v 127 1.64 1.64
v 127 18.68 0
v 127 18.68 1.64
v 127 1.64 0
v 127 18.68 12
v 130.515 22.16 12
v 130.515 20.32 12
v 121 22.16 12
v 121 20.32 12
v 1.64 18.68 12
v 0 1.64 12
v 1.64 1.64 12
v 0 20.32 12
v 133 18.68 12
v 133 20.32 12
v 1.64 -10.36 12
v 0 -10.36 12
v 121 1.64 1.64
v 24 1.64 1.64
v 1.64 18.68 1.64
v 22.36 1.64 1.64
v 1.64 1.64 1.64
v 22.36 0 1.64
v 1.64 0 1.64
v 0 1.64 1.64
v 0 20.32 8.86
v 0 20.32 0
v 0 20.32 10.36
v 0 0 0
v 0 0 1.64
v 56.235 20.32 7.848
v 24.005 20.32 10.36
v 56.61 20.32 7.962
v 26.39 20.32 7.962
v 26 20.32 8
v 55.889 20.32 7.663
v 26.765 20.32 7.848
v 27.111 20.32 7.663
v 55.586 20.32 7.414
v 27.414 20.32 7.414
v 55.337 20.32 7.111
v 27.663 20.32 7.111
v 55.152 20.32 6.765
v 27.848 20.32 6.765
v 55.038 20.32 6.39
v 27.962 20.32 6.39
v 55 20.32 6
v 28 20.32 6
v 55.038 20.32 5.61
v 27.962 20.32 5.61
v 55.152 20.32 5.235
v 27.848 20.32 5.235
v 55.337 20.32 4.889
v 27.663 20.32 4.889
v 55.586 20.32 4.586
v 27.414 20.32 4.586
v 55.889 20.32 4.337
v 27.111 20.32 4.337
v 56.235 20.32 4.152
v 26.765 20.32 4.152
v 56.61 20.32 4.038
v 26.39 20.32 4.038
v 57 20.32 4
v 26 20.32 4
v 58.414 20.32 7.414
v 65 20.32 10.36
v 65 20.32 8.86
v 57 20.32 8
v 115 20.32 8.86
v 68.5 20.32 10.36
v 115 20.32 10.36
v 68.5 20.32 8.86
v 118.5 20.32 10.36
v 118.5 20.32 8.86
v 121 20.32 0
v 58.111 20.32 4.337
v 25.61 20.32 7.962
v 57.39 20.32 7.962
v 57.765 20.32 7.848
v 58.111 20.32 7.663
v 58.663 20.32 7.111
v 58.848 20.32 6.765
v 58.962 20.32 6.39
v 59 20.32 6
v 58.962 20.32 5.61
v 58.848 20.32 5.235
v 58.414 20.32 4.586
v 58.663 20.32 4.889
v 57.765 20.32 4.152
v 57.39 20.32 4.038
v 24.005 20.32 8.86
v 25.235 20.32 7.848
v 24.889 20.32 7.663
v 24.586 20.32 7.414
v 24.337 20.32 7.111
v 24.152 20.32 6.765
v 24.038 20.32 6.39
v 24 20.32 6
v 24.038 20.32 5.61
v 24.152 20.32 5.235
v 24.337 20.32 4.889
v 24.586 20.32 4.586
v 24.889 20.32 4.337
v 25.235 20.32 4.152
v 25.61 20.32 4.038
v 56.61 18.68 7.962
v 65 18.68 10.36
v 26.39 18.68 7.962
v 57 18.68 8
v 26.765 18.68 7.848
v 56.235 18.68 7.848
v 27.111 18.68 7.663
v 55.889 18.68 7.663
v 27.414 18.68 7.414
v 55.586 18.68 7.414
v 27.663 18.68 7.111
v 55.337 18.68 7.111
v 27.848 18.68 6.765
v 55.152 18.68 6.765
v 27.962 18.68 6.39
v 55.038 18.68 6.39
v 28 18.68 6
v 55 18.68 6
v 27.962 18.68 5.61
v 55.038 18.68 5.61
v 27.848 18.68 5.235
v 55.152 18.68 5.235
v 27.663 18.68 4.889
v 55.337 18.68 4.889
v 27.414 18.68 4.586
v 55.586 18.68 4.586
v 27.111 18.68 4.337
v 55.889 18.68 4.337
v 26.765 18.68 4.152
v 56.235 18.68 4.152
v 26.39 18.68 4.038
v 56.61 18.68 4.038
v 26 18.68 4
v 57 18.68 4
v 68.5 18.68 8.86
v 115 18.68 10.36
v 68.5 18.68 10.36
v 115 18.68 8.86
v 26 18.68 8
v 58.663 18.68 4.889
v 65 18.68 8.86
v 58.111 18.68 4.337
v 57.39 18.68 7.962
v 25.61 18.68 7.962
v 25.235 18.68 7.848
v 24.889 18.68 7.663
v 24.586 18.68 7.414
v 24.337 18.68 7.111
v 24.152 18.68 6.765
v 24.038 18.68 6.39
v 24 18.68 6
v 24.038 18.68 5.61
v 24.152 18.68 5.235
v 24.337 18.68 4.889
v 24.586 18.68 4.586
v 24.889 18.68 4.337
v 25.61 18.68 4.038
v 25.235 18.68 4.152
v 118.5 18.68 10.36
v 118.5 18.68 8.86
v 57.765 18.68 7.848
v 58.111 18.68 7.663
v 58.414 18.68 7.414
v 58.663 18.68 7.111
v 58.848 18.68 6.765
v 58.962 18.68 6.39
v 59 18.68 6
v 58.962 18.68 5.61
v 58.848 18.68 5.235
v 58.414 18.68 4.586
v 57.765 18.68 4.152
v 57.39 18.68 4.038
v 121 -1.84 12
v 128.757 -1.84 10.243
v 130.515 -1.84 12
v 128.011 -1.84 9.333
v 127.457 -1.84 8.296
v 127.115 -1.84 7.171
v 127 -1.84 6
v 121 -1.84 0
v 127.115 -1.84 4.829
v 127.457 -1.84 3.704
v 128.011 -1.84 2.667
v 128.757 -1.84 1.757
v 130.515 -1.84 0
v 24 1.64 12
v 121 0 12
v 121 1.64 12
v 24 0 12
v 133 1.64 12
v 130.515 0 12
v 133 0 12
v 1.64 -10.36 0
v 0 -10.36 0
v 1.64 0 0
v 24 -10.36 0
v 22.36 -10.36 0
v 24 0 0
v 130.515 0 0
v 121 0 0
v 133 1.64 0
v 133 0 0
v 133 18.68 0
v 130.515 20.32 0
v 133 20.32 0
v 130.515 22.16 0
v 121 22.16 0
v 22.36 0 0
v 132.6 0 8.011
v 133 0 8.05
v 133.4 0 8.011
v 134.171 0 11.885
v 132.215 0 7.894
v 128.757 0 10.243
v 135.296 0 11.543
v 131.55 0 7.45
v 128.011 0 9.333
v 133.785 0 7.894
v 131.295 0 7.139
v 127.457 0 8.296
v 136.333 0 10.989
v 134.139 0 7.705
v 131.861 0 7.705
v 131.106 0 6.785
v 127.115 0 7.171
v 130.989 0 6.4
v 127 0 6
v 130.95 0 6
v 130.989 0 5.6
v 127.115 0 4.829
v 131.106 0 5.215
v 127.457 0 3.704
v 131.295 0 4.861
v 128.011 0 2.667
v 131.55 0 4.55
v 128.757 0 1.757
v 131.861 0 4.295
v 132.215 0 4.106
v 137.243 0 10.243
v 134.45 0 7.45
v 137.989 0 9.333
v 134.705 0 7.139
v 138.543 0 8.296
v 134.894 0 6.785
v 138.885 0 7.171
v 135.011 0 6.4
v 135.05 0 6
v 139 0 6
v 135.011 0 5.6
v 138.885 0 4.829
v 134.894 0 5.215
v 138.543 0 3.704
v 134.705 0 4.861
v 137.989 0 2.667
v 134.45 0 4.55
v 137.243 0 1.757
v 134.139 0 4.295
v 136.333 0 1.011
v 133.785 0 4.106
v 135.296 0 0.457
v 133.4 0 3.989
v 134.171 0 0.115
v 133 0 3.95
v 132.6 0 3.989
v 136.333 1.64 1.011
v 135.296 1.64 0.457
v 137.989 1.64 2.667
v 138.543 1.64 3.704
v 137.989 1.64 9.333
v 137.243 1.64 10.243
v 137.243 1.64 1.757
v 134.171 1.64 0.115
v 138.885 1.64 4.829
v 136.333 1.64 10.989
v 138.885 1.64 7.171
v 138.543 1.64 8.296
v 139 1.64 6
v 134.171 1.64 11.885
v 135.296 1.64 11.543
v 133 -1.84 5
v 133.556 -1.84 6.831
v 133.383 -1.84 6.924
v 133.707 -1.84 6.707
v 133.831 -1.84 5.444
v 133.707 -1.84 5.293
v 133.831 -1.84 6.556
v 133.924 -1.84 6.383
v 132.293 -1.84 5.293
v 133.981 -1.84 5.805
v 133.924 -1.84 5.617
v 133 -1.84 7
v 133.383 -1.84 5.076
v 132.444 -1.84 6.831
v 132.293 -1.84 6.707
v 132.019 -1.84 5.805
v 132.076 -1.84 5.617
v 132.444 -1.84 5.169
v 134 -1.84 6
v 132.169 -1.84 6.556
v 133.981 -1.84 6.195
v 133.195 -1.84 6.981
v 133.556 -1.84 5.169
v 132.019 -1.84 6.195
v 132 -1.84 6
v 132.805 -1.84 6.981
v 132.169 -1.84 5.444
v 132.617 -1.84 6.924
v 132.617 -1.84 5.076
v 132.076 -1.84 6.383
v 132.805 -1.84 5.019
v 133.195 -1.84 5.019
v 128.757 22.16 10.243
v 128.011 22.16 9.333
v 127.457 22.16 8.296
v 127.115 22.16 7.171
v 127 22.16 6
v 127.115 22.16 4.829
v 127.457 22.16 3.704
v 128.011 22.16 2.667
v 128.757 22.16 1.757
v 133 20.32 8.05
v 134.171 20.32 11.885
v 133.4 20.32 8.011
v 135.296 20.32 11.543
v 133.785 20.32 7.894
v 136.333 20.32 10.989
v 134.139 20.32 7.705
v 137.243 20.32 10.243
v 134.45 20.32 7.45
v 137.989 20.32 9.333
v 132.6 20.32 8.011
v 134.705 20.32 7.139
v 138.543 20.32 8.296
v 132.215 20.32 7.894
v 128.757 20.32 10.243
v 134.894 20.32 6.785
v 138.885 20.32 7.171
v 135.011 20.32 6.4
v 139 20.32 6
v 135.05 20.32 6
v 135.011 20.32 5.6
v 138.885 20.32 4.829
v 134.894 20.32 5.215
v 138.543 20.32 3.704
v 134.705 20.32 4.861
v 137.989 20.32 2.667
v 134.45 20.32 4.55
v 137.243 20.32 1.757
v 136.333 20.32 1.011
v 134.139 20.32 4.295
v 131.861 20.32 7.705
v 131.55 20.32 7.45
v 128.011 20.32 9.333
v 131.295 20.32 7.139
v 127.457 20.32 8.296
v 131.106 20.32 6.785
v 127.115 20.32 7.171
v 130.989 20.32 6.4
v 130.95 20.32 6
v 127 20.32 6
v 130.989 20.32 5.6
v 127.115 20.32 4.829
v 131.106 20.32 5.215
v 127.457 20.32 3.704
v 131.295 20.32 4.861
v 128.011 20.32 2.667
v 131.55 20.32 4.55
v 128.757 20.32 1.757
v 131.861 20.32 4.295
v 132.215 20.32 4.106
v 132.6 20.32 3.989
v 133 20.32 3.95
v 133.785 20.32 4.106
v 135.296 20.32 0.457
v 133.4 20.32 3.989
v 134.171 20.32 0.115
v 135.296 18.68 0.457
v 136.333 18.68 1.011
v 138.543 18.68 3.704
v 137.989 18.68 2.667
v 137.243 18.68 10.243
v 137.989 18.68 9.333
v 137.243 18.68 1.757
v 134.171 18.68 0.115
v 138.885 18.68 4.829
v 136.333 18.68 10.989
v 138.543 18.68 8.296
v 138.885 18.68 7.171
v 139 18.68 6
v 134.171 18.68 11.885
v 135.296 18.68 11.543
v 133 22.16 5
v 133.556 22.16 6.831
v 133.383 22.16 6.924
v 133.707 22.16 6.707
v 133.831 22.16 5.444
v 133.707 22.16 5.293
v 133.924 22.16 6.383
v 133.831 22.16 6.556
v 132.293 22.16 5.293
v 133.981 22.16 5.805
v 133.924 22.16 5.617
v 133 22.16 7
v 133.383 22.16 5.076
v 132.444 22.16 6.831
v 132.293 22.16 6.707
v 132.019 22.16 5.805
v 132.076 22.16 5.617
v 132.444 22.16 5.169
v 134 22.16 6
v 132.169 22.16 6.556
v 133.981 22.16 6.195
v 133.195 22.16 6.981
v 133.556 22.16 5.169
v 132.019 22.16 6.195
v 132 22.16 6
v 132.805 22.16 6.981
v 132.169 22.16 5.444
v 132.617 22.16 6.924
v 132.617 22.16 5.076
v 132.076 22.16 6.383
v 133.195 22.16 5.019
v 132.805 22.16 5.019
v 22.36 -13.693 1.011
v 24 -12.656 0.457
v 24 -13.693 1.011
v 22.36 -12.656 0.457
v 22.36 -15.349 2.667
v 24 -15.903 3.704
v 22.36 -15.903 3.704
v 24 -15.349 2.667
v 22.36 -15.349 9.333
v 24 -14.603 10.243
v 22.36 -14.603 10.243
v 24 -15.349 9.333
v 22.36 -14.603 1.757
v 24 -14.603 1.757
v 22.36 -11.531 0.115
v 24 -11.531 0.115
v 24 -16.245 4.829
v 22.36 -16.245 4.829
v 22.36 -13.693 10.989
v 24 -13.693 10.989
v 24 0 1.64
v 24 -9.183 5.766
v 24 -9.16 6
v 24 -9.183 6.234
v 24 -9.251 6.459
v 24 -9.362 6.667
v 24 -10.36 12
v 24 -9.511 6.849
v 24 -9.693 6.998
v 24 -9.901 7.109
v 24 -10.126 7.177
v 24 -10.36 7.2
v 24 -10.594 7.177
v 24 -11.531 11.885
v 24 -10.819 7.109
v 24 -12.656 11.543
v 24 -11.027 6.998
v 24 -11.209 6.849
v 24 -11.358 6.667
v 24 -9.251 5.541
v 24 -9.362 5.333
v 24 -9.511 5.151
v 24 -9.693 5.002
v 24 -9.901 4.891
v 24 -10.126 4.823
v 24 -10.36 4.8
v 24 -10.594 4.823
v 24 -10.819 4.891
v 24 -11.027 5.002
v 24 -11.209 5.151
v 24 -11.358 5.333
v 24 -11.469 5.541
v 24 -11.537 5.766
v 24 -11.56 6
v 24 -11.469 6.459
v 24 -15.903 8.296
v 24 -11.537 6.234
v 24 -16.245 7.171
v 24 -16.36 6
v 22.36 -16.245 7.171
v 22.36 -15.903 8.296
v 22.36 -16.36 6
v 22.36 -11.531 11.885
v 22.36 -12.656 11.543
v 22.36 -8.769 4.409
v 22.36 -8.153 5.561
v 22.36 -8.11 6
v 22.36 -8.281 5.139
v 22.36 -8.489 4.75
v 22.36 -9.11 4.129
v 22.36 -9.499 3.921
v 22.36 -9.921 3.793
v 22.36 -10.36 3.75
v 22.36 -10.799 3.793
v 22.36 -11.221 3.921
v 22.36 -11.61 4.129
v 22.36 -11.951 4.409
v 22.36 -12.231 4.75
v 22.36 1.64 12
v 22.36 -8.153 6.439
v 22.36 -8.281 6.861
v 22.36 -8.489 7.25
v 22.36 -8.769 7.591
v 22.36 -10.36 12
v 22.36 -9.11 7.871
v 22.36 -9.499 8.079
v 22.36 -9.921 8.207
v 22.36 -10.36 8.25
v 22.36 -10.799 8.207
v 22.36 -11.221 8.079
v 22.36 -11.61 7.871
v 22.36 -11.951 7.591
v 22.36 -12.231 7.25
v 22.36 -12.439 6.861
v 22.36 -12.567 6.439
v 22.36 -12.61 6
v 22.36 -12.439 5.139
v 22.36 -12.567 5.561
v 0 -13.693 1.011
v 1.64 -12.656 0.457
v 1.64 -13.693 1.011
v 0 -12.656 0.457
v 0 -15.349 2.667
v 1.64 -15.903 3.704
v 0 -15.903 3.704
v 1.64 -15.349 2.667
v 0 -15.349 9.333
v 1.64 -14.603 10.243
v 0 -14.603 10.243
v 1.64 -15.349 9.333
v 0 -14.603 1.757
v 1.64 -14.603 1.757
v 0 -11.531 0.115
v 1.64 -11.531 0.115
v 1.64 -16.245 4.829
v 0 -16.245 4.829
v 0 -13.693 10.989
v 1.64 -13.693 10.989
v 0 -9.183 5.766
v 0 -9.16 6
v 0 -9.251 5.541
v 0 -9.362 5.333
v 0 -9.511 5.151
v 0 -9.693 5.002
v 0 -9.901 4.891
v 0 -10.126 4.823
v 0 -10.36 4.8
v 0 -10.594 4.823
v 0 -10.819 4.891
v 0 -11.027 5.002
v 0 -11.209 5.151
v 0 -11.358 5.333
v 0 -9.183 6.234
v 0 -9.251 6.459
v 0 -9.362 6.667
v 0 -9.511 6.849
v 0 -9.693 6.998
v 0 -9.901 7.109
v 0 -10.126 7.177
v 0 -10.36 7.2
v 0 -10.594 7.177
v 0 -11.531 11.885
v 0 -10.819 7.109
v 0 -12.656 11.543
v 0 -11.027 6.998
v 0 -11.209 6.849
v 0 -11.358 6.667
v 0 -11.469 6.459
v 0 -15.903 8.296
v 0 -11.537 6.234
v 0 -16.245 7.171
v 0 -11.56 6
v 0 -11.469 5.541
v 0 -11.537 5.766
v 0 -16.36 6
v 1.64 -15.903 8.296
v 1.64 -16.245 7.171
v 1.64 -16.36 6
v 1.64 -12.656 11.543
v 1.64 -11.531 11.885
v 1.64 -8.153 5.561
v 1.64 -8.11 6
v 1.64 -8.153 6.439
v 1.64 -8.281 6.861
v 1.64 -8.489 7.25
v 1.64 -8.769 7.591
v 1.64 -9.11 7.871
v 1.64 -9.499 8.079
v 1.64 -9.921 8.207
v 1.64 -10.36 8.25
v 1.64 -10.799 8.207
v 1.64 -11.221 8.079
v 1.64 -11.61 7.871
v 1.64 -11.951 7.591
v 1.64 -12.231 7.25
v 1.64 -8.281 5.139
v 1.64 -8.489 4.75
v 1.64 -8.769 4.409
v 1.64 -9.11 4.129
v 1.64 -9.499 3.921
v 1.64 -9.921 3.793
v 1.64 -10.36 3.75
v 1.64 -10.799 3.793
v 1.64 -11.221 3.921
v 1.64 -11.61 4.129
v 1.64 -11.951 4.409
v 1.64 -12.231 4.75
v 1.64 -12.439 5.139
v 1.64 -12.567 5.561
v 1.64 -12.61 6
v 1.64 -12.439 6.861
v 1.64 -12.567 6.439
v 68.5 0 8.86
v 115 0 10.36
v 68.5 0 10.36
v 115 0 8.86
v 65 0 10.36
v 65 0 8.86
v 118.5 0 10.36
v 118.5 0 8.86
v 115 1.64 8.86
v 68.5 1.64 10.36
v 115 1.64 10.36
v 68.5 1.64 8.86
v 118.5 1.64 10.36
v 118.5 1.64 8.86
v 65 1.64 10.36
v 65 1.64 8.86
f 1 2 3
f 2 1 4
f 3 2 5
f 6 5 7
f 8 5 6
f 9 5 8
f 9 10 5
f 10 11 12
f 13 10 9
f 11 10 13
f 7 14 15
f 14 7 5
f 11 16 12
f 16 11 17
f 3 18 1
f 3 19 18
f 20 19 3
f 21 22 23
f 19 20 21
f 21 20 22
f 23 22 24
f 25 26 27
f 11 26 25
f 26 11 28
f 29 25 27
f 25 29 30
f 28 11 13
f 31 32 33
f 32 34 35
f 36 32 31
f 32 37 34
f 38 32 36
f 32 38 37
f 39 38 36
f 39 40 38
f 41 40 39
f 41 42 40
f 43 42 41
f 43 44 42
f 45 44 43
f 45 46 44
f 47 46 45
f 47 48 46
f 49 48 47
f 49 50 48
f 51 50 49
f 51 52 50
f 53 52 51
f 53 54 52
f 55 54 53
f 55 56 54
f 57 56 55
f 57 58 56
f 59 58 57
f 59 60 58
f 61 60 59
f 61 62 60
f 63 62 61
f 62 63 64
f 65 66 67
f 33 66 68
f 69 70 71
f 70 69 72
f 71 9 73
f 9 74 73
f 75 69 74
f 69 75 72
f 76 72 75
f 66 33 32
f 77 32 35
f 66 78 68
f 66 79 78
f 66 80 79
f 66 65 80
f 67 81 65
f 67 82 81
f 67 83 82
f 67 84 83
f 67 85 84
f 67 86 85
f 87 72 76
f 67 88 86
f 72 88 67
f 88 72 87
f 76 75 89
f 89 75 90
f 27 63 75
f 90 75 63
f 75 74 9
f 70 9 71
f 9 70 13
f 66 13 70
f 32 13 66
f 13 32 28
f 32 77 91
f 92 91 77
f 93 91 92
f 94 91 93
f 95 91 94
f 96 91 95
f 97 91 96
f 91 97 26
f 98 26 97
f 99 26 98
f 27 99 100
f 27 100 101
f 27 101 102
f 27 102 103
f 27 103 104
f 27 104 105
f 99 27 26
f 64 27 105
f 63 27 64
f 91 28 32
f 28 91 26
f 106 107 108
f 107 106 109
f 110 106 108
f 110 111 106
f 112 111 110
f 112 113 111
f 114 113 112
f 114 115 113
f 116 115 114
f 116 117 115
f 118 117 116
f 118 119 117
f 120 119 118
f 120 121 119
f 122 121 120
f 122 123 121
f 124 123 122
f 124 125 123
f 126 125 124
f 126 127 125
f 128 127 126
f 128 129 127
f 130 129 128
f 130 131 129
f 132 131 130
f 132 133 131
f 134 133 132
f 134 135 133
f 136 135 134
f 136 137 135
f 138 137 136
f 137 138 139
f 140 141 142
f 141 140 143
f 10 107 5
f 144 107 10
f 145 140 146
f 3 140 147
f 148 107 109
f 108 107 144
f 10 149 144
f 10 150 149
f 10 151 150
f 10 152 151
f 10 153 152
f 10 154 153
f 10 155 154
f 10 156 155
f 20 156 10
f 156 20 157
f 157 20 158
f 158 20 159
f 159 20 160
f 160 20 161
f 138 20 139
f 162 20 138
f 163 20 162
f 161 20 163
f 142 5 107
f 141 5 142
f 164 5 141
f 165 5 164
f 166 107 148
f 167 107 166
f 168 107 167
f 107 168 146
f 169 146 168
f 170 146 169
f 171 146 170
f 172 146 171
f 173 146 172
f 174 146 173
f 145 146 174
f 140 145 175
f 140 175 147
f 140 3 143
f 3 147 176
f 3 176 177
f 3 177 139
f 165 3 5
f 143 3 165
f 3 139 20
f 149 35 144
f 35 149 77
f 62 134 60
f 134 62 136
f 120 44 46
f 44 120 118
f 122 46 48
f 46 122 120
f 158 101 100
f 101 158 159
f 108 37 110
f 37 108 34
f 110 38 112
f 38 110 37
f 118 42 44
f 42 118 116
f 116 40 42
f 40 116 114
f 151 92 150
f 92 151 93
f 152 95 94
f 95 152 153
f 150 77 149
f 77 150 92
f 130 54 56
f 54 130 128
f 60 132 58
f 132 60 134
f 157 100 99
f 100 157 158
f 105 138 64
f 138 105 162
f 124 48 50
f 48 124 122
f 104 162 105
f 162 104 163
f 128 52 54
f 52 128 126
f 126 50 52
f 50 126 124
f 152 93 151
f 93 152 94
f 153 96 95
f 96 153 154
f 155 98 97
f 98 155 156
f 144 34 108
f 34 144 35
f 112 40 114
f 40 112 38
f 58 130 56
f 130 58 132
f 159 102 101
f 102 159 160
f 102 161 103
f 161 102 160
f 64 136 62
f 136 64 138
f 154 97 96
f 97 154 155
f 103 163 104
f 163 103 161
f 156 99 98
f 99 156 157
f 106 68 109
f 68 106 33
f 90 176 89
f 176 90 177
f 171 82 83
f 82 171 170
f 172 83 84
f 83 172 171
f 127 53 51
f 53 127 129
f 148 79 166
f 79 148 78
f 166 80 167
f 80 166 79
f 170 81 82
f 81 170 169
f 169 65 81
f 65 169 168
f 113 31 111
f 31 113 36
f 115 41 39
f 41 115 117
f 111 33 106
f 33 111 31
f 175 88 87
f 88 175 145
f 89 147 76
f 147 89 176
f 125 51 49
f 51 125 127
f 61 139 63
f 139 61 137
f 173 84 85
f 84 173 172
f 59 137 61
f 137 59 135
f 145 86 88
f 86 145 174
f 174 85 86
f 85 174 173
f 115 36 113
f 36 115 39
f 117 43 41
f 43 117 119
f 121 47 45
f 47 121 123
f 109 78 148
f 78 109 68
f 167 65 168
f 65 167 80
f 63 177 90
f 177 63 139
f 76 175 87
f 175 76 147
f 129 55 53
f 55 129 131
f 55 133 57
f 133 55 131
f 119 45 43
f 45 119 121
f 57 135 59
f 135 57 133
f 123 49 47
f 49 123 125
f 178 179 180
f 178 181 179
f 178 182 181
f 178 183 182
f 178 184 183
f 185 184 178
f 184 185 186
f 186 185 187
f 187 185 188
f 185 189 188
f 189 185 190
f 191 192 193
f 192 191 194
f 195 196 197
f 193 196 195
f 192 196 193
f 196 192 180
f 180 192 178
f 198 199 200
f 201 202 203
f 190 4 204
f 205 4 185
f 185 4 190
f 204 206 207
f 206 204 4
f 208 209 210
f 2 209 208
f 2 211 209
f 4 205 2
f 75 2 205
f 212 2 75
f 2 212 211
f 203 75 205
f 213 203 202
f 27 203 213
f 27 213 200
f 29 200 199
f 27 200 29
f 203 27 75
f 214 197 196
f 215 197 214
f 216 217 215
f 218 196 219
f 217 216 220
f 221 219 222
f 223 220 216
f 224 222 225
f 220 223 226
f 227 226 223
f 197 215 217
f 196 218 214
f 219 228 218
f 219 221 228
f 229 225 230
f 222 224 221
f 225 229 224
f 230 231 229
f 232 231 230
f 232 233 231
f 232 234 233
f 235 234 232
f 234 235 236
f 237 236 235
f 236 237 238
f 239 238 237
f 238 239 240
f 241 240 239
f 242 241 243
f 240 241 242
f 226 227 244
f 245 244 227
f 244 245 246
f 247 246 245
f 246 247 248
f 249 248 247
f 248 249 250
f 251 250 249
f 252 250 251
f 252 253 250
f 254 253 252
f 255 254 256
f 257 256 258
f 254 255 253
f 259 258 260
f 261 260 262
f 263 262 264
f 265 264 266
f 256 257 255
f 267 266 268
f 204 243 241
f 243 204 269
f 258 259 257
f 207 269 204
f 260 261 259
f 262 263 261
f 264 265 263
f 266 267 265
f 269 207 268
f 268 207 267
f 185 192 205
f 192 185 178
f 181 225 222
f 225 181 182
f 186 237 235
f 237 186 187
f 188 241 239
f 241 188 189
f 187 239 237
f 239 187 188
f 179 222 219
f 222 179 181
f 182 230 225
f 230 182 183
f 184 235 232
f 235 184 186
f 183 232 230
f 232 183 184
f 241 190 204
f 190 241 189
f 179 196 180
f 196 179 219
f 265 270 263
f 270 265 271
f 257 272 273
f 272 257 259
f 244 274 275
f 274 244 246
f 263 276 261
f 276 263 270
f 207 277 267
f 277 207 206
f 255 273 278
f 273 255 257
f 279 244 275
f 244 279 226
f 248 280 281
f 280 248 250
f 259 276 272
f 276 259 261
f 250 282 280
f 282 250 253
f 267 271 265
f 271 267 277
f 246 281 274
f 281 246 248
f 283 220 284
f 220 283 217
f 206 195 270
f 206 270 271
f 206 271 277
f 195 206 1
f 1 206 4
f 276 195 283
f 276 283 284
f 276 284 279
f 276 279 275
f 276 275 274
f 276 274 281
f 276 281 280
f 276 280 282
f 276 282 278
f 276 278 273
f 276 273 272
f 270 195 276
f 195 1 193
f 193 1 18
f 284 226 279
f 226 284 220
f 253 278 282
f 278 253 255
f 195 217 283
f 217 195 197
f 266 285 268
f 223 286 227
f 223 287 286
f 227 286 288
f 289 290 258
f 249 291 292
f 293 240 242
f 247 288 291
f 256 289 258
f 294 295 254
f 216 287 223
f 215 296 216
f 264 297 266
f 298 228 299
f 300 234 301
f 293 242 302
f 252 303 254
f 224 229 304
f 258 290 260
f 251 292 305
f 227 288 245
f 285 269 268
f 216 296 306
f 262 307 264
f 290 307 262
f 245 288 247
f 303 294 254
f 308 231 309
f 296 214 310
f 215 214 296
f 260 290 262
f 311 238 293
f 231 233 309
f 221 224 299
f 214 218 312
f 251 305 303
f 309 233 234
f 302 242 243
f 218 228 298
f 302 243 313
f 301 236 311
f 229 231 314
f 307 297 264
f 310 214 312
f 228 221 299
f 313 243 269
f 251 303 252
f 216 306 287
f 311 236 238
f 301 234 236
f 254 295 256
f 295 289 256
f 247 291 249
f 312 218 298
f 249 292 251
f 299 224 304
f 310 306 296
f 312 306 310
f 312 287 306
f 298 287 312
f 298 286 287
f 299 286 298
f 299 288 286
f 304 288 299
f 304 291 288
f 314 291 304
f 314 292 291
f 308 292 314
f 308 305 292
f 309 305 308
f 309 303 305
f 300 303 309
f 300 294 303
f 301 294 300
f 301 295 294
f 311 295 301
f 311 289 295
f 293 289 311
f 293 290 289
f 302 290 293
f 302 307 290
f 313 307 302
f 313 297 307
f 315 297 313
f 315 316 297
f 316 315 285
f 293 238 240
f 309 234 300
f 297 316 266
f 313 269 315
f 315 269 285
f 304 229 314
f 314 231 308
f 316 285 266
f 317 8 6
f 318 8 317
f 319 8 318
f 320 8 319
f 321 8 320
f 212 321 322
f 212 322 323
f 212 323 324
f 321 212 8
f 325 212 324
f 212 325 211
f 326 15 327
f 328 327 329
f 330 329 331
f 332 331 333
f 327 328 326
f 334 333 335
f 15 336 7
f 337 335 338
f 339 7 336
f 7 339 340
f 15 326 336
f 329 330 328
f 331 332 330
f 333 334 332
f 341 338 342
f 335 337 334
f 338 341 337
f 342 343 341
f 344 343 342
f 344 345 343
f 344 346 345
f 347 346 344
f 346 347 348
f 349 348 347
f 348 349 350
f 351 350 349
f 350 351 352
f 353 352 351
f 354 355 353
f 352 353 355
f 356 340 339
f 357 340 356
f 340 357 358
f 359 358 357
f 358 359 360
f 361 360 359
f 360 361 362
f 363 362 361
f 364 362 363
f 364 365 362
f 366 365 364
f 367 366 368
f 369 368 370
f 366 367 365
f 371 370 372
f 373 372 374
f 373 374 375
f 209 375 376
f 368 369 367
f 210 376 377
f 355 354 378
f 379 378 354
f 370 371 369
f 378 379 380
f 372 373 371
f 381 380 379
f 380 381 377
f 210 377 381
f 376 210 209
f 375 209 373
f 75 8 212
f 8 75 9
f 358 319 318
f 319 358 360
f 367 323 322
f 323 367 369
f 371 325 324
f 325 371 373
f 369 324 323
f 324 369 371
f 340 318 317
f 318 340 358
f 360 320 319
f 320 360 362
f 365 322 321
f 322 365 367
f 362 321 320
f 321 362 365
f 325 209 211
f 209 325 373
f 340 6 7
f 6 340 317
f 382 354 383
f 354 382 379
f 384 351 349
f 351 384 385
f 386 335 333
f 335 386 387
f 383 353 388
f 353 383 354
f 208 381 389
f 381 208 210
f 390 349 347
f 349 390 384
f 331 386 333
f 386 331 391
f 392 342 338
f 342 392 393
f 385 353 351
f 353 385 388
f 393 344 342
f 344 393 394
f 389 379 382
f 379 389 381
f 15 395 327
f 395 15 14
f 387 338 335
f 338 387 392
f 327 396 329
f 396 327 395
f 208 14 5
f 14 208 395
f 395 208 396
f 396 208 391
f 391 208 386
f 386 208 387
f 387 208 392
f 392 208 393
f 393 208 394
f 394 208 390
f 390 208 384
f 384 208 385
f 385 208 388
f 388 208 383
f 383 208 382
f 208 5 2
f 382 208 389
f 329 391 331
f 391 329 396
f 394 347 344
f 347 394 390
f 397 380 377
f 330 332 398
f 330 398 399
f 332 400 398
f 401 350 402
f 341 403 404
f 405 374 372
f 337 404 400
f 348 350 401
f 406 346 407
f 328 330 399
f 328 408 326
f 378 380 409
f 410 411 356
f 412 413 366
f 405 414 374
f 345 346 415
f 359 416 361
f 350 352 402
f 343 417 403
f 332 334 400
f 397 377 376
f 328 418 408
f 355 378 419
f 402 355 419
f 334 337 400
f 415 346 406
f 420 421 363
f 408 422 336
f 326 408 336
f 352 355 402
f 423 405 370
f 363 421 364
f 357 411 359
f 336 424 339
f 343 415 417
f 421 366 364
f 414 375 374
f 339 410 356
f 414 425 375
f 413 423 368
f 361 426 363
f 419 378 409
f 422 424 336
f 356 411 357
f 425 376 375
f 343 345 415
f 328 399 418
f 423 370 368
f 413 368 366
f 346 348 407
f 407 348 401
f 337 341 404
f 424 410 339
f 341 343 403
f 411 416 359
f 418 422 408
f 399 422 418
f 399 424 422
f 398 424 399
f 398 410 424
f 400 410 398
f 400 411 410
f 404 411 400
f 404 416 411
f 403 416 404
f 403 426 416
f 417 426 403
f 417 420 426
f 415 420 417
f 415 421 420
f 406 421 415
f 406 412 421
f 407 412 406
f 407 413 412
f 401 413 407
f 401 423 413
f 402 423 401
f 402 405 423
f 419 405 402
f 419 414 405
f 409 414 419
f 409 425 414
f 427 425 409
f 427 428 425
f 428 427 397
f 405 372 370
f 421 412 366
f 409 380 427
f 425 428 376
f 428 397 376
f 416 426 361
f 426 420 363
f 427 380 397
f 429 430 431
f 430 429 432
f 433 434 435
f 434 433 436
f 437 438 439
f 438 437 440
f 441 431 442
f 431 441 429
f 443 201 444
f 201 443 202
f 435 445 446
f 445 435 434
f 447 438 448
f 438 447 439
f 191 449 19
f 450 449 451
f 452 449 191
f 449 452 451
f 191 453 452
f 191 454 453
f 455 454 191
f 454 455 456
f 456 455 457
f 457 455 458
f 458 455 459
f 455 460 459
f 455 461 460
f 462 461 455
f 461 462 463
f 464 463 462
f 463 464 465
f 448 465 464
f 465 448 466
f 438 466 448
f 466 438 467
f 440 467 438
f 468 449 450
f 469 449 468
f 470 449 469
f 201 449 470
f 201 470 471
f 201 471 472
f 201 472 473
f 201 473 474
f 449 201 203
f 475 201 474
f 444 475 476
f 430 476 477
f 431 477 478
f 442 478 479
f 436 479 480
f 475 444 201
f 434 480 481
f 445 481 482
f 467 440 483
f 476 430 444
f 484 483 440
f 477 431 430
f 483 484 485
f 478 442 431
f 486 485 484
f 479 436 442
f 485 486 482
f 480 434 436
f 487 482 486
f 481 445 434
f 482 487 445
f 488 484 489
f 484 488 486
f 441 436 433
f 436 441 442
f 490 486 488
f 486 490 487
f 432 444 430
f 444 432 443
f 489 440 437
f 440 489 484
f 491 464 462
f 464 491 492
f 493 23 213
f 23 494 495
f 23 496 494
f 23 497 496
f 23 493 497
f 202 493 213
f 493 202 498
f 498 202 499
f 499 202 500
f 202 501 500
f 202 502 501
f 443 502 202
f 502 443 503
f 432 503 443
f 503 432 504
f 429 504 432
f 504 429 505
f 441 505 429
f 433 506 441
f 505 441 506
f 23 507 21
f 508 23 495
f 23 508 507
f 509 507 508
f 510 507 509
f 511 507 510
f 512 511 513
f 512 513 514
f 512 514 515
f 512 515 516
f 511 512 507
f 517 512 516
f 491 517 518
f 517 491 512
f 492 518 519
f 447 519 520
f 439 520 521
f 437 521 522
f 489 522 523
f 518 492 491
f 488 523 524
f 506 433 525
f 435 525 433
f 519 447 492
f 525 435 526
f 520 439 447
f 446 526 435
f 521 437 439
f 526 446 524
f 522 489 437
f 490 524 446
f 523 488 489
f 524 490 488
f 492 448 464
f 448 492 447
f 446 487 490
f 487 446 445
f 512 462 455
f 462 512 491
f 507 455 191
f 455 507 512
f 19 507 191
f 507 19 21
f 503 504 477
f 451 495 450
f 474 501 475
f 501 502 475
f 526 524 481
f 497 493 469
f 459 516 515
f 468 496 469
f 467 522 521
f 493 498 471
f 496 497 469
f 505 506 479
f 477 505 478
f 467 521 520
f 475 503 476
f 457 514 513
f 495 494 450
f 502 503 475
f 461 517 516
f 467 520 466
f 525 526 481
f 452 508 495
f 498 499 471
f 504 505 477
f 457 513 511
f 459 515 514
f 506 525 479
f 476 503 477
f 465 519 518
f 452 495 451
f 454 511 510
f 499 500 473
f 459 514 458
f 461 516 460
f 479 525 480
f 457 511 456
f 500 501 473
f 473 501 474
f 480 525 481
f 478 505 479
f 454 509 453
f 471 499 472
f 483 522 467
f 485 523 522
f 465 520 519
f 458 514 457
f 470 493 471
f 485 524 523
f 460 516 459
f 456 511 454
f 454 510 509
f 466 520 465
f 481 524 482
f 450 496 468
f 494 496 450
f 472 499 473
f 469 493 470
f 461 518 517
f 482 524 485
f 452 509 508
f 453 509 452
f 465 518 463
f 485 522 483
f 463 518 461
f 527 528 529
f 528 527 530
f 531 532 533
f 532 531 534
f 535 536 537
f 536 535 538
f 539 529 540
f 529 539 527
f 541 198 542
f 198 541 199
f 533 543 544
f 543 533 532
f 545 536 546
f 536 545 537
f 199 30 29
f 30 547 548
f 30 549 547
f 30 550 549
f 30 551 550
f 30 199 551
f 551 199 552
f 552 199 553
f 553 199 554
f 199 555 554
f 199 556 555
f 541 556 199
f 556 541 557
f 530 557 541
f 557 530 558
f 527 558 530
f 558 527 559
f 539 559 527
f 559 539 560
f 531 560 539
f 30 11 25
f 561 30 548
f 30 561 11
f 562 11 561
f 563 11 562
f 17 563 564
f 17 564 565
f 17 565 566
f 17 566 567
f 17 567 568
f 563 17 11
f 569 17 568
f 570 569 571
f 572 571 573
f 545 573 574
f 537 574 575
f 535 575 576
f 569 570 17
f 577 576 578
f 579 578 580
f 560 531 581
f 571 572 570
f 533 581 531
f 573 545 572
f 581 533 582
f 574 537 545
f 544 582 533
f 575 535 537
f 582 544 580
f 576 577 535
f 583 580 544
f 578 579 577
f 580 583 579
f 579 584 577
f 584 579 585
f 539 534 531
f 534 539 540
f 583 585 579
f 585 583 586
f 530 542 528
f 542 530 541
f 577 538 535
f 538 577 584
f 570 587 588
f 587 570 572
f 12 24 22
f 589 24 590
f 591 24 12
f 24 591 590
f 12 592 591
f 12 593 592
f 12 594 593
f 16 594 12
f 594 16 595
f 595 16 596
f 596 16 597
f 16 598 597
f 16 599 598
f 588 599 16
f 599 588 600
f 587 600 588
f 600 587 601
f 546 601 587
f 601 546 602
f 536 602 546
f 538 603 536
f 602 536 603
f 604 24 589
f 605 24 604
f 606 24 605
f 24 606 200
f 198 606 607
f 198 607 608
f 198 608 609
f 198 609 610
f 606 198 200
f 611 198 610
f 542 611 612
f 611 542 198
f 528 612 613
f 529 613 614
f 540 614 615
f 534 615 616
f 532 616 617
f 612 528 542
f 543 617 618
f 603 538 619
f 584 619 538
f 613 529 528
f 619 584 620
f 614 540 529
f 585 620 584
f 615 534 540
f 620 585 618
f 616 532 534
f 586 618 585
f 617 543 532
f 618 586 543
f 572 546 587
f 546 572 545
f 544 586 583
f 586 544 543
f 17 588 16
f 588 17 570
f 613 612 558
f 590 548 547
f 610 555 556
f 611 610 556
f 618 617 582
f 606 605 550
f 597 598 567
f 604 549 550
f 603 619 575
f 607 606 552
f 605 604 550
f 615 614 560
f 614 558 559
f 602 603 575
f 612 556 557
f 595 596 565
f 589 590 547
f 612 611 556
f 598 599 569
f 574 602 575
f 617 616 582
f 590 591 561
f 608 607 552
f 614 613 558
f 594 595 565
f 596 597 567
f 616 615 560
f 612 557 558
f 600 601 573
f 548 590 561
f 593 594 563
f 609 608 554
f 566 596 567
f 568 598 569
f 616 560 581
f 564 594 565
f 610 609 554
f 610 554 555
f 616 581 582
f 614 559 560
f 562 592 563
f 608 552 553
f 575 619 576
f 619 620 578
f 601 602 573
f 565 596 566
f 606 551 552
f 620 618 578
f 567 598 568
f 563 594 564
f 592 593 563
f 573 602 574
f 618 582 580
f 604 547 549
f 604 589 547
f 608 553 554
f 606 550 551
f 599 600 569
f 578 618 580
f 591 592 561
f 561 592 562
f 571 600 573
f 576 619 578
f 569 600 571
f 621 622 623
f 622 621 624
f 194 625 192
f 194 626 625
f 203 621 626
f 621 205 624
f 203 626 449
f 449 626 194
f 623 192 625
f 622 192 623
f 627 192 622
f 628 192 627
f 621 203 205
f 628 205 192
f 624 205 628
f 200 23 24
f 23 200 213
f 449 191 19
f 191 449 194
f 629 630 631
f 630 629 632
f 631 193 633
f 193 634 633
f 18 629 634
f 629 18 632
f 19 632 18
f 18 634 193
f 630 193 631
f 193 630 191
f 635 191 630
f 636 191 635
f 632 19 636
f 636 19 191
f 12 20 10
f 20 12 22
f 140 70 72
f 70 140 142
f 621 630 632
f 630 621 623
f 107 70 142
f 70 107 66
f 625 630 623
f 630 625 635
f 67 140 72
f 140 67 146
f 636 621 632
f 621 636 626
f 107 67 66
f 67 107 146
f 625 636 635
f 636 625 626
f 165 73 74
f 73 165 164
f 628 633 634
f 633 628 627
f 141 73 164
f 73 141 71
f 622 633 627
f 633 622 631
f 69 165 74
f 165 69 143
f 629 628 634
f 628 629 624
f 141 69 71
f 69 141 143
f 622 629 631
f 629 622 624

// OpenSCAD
$fn = 32;
GLITCH=.01;


wt=1.64; // 1.5mm walls
slack = .2; // slack applies twice

id=17.04; // 16.68 on the most tight spot
od=id + 2*slack + 4*wt;
joint_dia = 12;
joint_d1 = 4.1;
joint_d2 = 2;


ziptie_w = 3.5;
ziptie_h = 1.5;

// 1:
// Back bar with connector for https://www.thingiverse.com/thing:2920060
//   Both down and to the hotend


// Design goals:
// - Zip tie mounts
// - Connects to the extruder mount
//   As for stock ender 3, there is only the BS cable mount. Here you probably
//   need a small spacer plate to get screw access

// Most important for interfacing:
// - Top connector is outer (stop=outer)
// - Bottom connector is inner (start=inner)
// - Both of them have a wall thickness of 1.64

//rotate([180,0,0])
    //inner_connector(45);
//outer_connector();

// As for the measurements of the bar:
// Hole distance is 31mm.
// About 14mm from outer screw to center of bar below
// About 70mm from inner screw to termination point
// About id (17mm) inner space
// And then half of the od extra

c_total_len = 14 + 70 + 31 + od/2;

//rotate([90,0,0])

difference() {
    channel();
    
    translate([-GLITCH/2, id+2*wt, joint_dia-ziptie_h-wt])
        cube([od+GLITCH, ziptie_w, ziptie_h]);

    translate([65,-GLITCH/2,joint_dia-ziptie_h-wt])
        cube([ziptie_w, od+GLITCH, ziptie_h]);

    translate([65+50,-GLITCH/2,joint_dia-ziptie_h-wt])
        cube([ziptie_w, od+GLITCH, ziptie_h]);
}

module channel() {
    
    // U channel first
    cube([c_total_len, id+2*wt, wt]);
    
    
    // screwholes in this one, M3. 4mm dia to be sure.
    difference() {
        // long wall
        translate([0,id+wt,wt])
            cube([c_total_len, wt, joint_dia-wt]);

        // holes for extruder plate mount
        translate([od/2 + 14,id+2*wt,joint_dia/2])
            rotate([90,0,0])
            cylinder(d=4, h=wt);
        translate([od/2 + 14 + 31,id+2*wt,joint_dia/2])
            rotate([90,0,0])
            cylinder(d=4, h=wt);
    }
    // short wall
    translate([od,0,wt])
            cube([c_total_len-od, wt, joint_dia-wt]);
    
    // end wall
    translate([0,wt,0])
        cube([wt, id, joint_dia]);

    translate([c_total_len+joint_dia/2,id/2+wt,joint_dia/2])
        rotate([0,0,-90])
        inner_connector();

    translate([od/2,wt-joint_dia,joint_dia/2])
        mirror([0,1,0])
        outer_connector();
}





module outer_connector_half() {
    difference() {
        union() {
            // Circle
            translate([od/2-wt,0,0])
                rotate([0,90,0])
                cylinder(d=joint_dia,h=wt);
            // Extension, inner
            translate([od/2-wt,-joint_dia,-joint_dia/2])
                cube([wt,joint_dia,joint_dia]);
        }
        // Pin
        translate([od/2-wt,0,0])
            rotate([0,90,0])
            cylinder(d1=joint_d1+2*slack,d2=joint_d2+2*slack,h=wt);
    }
    // Extension, outer
    owt=wt+slack;
    
    
}

module outer_connector() {
    outer_connector_half();
    mirror([1,0,0])
        outer_connector_half();
}

module inner_connector_half(theta) {
    // Circle
    translate([id/2,0,0])
        rotate([0,90,0])
        cylinder(d=joint_dia,h=wt);
    // Pin
    translate([id/2+wt,0,0])
        rotate([0,90,0])
        cylinder(d1=joint_d1,d2=joint_d2,h=wt+slack);
    // Extension, inner
    translate([id/2+wt/2,-joint_dia/2,0])
        cube([wt,joint_dia,joint_dia], center=true);
    // Extension, outer
    owt=wt+slack;
    
    difference() {
        translate([id/2+wt+owt/2,-joint_dia/2,0])
            cube([owt,joint_dia,joint_dia], center=true);
        translate([id/2+wt,0,0])
            rotate([0,90,0])
            cylinder(d=joint_dia, h=owt+GLITCH);
        
        rotate([-theta,0,0])
            translate([id/2+wt,0,-joint_dia/2])
            cube([owt+GLITCH,joint_dia,joint_dia]);
        rotate([theta,0,0])
            translate([id/2+wt,0,-joint_dia/2])
            cube([owt+GLITCH,joint_dia,joint_dia]);
    }
}

module inner_connector(theta=45) {
    inner_connector_half(theta);
    mirror([1,0,0])
        inner_connector_half(theta);
}
